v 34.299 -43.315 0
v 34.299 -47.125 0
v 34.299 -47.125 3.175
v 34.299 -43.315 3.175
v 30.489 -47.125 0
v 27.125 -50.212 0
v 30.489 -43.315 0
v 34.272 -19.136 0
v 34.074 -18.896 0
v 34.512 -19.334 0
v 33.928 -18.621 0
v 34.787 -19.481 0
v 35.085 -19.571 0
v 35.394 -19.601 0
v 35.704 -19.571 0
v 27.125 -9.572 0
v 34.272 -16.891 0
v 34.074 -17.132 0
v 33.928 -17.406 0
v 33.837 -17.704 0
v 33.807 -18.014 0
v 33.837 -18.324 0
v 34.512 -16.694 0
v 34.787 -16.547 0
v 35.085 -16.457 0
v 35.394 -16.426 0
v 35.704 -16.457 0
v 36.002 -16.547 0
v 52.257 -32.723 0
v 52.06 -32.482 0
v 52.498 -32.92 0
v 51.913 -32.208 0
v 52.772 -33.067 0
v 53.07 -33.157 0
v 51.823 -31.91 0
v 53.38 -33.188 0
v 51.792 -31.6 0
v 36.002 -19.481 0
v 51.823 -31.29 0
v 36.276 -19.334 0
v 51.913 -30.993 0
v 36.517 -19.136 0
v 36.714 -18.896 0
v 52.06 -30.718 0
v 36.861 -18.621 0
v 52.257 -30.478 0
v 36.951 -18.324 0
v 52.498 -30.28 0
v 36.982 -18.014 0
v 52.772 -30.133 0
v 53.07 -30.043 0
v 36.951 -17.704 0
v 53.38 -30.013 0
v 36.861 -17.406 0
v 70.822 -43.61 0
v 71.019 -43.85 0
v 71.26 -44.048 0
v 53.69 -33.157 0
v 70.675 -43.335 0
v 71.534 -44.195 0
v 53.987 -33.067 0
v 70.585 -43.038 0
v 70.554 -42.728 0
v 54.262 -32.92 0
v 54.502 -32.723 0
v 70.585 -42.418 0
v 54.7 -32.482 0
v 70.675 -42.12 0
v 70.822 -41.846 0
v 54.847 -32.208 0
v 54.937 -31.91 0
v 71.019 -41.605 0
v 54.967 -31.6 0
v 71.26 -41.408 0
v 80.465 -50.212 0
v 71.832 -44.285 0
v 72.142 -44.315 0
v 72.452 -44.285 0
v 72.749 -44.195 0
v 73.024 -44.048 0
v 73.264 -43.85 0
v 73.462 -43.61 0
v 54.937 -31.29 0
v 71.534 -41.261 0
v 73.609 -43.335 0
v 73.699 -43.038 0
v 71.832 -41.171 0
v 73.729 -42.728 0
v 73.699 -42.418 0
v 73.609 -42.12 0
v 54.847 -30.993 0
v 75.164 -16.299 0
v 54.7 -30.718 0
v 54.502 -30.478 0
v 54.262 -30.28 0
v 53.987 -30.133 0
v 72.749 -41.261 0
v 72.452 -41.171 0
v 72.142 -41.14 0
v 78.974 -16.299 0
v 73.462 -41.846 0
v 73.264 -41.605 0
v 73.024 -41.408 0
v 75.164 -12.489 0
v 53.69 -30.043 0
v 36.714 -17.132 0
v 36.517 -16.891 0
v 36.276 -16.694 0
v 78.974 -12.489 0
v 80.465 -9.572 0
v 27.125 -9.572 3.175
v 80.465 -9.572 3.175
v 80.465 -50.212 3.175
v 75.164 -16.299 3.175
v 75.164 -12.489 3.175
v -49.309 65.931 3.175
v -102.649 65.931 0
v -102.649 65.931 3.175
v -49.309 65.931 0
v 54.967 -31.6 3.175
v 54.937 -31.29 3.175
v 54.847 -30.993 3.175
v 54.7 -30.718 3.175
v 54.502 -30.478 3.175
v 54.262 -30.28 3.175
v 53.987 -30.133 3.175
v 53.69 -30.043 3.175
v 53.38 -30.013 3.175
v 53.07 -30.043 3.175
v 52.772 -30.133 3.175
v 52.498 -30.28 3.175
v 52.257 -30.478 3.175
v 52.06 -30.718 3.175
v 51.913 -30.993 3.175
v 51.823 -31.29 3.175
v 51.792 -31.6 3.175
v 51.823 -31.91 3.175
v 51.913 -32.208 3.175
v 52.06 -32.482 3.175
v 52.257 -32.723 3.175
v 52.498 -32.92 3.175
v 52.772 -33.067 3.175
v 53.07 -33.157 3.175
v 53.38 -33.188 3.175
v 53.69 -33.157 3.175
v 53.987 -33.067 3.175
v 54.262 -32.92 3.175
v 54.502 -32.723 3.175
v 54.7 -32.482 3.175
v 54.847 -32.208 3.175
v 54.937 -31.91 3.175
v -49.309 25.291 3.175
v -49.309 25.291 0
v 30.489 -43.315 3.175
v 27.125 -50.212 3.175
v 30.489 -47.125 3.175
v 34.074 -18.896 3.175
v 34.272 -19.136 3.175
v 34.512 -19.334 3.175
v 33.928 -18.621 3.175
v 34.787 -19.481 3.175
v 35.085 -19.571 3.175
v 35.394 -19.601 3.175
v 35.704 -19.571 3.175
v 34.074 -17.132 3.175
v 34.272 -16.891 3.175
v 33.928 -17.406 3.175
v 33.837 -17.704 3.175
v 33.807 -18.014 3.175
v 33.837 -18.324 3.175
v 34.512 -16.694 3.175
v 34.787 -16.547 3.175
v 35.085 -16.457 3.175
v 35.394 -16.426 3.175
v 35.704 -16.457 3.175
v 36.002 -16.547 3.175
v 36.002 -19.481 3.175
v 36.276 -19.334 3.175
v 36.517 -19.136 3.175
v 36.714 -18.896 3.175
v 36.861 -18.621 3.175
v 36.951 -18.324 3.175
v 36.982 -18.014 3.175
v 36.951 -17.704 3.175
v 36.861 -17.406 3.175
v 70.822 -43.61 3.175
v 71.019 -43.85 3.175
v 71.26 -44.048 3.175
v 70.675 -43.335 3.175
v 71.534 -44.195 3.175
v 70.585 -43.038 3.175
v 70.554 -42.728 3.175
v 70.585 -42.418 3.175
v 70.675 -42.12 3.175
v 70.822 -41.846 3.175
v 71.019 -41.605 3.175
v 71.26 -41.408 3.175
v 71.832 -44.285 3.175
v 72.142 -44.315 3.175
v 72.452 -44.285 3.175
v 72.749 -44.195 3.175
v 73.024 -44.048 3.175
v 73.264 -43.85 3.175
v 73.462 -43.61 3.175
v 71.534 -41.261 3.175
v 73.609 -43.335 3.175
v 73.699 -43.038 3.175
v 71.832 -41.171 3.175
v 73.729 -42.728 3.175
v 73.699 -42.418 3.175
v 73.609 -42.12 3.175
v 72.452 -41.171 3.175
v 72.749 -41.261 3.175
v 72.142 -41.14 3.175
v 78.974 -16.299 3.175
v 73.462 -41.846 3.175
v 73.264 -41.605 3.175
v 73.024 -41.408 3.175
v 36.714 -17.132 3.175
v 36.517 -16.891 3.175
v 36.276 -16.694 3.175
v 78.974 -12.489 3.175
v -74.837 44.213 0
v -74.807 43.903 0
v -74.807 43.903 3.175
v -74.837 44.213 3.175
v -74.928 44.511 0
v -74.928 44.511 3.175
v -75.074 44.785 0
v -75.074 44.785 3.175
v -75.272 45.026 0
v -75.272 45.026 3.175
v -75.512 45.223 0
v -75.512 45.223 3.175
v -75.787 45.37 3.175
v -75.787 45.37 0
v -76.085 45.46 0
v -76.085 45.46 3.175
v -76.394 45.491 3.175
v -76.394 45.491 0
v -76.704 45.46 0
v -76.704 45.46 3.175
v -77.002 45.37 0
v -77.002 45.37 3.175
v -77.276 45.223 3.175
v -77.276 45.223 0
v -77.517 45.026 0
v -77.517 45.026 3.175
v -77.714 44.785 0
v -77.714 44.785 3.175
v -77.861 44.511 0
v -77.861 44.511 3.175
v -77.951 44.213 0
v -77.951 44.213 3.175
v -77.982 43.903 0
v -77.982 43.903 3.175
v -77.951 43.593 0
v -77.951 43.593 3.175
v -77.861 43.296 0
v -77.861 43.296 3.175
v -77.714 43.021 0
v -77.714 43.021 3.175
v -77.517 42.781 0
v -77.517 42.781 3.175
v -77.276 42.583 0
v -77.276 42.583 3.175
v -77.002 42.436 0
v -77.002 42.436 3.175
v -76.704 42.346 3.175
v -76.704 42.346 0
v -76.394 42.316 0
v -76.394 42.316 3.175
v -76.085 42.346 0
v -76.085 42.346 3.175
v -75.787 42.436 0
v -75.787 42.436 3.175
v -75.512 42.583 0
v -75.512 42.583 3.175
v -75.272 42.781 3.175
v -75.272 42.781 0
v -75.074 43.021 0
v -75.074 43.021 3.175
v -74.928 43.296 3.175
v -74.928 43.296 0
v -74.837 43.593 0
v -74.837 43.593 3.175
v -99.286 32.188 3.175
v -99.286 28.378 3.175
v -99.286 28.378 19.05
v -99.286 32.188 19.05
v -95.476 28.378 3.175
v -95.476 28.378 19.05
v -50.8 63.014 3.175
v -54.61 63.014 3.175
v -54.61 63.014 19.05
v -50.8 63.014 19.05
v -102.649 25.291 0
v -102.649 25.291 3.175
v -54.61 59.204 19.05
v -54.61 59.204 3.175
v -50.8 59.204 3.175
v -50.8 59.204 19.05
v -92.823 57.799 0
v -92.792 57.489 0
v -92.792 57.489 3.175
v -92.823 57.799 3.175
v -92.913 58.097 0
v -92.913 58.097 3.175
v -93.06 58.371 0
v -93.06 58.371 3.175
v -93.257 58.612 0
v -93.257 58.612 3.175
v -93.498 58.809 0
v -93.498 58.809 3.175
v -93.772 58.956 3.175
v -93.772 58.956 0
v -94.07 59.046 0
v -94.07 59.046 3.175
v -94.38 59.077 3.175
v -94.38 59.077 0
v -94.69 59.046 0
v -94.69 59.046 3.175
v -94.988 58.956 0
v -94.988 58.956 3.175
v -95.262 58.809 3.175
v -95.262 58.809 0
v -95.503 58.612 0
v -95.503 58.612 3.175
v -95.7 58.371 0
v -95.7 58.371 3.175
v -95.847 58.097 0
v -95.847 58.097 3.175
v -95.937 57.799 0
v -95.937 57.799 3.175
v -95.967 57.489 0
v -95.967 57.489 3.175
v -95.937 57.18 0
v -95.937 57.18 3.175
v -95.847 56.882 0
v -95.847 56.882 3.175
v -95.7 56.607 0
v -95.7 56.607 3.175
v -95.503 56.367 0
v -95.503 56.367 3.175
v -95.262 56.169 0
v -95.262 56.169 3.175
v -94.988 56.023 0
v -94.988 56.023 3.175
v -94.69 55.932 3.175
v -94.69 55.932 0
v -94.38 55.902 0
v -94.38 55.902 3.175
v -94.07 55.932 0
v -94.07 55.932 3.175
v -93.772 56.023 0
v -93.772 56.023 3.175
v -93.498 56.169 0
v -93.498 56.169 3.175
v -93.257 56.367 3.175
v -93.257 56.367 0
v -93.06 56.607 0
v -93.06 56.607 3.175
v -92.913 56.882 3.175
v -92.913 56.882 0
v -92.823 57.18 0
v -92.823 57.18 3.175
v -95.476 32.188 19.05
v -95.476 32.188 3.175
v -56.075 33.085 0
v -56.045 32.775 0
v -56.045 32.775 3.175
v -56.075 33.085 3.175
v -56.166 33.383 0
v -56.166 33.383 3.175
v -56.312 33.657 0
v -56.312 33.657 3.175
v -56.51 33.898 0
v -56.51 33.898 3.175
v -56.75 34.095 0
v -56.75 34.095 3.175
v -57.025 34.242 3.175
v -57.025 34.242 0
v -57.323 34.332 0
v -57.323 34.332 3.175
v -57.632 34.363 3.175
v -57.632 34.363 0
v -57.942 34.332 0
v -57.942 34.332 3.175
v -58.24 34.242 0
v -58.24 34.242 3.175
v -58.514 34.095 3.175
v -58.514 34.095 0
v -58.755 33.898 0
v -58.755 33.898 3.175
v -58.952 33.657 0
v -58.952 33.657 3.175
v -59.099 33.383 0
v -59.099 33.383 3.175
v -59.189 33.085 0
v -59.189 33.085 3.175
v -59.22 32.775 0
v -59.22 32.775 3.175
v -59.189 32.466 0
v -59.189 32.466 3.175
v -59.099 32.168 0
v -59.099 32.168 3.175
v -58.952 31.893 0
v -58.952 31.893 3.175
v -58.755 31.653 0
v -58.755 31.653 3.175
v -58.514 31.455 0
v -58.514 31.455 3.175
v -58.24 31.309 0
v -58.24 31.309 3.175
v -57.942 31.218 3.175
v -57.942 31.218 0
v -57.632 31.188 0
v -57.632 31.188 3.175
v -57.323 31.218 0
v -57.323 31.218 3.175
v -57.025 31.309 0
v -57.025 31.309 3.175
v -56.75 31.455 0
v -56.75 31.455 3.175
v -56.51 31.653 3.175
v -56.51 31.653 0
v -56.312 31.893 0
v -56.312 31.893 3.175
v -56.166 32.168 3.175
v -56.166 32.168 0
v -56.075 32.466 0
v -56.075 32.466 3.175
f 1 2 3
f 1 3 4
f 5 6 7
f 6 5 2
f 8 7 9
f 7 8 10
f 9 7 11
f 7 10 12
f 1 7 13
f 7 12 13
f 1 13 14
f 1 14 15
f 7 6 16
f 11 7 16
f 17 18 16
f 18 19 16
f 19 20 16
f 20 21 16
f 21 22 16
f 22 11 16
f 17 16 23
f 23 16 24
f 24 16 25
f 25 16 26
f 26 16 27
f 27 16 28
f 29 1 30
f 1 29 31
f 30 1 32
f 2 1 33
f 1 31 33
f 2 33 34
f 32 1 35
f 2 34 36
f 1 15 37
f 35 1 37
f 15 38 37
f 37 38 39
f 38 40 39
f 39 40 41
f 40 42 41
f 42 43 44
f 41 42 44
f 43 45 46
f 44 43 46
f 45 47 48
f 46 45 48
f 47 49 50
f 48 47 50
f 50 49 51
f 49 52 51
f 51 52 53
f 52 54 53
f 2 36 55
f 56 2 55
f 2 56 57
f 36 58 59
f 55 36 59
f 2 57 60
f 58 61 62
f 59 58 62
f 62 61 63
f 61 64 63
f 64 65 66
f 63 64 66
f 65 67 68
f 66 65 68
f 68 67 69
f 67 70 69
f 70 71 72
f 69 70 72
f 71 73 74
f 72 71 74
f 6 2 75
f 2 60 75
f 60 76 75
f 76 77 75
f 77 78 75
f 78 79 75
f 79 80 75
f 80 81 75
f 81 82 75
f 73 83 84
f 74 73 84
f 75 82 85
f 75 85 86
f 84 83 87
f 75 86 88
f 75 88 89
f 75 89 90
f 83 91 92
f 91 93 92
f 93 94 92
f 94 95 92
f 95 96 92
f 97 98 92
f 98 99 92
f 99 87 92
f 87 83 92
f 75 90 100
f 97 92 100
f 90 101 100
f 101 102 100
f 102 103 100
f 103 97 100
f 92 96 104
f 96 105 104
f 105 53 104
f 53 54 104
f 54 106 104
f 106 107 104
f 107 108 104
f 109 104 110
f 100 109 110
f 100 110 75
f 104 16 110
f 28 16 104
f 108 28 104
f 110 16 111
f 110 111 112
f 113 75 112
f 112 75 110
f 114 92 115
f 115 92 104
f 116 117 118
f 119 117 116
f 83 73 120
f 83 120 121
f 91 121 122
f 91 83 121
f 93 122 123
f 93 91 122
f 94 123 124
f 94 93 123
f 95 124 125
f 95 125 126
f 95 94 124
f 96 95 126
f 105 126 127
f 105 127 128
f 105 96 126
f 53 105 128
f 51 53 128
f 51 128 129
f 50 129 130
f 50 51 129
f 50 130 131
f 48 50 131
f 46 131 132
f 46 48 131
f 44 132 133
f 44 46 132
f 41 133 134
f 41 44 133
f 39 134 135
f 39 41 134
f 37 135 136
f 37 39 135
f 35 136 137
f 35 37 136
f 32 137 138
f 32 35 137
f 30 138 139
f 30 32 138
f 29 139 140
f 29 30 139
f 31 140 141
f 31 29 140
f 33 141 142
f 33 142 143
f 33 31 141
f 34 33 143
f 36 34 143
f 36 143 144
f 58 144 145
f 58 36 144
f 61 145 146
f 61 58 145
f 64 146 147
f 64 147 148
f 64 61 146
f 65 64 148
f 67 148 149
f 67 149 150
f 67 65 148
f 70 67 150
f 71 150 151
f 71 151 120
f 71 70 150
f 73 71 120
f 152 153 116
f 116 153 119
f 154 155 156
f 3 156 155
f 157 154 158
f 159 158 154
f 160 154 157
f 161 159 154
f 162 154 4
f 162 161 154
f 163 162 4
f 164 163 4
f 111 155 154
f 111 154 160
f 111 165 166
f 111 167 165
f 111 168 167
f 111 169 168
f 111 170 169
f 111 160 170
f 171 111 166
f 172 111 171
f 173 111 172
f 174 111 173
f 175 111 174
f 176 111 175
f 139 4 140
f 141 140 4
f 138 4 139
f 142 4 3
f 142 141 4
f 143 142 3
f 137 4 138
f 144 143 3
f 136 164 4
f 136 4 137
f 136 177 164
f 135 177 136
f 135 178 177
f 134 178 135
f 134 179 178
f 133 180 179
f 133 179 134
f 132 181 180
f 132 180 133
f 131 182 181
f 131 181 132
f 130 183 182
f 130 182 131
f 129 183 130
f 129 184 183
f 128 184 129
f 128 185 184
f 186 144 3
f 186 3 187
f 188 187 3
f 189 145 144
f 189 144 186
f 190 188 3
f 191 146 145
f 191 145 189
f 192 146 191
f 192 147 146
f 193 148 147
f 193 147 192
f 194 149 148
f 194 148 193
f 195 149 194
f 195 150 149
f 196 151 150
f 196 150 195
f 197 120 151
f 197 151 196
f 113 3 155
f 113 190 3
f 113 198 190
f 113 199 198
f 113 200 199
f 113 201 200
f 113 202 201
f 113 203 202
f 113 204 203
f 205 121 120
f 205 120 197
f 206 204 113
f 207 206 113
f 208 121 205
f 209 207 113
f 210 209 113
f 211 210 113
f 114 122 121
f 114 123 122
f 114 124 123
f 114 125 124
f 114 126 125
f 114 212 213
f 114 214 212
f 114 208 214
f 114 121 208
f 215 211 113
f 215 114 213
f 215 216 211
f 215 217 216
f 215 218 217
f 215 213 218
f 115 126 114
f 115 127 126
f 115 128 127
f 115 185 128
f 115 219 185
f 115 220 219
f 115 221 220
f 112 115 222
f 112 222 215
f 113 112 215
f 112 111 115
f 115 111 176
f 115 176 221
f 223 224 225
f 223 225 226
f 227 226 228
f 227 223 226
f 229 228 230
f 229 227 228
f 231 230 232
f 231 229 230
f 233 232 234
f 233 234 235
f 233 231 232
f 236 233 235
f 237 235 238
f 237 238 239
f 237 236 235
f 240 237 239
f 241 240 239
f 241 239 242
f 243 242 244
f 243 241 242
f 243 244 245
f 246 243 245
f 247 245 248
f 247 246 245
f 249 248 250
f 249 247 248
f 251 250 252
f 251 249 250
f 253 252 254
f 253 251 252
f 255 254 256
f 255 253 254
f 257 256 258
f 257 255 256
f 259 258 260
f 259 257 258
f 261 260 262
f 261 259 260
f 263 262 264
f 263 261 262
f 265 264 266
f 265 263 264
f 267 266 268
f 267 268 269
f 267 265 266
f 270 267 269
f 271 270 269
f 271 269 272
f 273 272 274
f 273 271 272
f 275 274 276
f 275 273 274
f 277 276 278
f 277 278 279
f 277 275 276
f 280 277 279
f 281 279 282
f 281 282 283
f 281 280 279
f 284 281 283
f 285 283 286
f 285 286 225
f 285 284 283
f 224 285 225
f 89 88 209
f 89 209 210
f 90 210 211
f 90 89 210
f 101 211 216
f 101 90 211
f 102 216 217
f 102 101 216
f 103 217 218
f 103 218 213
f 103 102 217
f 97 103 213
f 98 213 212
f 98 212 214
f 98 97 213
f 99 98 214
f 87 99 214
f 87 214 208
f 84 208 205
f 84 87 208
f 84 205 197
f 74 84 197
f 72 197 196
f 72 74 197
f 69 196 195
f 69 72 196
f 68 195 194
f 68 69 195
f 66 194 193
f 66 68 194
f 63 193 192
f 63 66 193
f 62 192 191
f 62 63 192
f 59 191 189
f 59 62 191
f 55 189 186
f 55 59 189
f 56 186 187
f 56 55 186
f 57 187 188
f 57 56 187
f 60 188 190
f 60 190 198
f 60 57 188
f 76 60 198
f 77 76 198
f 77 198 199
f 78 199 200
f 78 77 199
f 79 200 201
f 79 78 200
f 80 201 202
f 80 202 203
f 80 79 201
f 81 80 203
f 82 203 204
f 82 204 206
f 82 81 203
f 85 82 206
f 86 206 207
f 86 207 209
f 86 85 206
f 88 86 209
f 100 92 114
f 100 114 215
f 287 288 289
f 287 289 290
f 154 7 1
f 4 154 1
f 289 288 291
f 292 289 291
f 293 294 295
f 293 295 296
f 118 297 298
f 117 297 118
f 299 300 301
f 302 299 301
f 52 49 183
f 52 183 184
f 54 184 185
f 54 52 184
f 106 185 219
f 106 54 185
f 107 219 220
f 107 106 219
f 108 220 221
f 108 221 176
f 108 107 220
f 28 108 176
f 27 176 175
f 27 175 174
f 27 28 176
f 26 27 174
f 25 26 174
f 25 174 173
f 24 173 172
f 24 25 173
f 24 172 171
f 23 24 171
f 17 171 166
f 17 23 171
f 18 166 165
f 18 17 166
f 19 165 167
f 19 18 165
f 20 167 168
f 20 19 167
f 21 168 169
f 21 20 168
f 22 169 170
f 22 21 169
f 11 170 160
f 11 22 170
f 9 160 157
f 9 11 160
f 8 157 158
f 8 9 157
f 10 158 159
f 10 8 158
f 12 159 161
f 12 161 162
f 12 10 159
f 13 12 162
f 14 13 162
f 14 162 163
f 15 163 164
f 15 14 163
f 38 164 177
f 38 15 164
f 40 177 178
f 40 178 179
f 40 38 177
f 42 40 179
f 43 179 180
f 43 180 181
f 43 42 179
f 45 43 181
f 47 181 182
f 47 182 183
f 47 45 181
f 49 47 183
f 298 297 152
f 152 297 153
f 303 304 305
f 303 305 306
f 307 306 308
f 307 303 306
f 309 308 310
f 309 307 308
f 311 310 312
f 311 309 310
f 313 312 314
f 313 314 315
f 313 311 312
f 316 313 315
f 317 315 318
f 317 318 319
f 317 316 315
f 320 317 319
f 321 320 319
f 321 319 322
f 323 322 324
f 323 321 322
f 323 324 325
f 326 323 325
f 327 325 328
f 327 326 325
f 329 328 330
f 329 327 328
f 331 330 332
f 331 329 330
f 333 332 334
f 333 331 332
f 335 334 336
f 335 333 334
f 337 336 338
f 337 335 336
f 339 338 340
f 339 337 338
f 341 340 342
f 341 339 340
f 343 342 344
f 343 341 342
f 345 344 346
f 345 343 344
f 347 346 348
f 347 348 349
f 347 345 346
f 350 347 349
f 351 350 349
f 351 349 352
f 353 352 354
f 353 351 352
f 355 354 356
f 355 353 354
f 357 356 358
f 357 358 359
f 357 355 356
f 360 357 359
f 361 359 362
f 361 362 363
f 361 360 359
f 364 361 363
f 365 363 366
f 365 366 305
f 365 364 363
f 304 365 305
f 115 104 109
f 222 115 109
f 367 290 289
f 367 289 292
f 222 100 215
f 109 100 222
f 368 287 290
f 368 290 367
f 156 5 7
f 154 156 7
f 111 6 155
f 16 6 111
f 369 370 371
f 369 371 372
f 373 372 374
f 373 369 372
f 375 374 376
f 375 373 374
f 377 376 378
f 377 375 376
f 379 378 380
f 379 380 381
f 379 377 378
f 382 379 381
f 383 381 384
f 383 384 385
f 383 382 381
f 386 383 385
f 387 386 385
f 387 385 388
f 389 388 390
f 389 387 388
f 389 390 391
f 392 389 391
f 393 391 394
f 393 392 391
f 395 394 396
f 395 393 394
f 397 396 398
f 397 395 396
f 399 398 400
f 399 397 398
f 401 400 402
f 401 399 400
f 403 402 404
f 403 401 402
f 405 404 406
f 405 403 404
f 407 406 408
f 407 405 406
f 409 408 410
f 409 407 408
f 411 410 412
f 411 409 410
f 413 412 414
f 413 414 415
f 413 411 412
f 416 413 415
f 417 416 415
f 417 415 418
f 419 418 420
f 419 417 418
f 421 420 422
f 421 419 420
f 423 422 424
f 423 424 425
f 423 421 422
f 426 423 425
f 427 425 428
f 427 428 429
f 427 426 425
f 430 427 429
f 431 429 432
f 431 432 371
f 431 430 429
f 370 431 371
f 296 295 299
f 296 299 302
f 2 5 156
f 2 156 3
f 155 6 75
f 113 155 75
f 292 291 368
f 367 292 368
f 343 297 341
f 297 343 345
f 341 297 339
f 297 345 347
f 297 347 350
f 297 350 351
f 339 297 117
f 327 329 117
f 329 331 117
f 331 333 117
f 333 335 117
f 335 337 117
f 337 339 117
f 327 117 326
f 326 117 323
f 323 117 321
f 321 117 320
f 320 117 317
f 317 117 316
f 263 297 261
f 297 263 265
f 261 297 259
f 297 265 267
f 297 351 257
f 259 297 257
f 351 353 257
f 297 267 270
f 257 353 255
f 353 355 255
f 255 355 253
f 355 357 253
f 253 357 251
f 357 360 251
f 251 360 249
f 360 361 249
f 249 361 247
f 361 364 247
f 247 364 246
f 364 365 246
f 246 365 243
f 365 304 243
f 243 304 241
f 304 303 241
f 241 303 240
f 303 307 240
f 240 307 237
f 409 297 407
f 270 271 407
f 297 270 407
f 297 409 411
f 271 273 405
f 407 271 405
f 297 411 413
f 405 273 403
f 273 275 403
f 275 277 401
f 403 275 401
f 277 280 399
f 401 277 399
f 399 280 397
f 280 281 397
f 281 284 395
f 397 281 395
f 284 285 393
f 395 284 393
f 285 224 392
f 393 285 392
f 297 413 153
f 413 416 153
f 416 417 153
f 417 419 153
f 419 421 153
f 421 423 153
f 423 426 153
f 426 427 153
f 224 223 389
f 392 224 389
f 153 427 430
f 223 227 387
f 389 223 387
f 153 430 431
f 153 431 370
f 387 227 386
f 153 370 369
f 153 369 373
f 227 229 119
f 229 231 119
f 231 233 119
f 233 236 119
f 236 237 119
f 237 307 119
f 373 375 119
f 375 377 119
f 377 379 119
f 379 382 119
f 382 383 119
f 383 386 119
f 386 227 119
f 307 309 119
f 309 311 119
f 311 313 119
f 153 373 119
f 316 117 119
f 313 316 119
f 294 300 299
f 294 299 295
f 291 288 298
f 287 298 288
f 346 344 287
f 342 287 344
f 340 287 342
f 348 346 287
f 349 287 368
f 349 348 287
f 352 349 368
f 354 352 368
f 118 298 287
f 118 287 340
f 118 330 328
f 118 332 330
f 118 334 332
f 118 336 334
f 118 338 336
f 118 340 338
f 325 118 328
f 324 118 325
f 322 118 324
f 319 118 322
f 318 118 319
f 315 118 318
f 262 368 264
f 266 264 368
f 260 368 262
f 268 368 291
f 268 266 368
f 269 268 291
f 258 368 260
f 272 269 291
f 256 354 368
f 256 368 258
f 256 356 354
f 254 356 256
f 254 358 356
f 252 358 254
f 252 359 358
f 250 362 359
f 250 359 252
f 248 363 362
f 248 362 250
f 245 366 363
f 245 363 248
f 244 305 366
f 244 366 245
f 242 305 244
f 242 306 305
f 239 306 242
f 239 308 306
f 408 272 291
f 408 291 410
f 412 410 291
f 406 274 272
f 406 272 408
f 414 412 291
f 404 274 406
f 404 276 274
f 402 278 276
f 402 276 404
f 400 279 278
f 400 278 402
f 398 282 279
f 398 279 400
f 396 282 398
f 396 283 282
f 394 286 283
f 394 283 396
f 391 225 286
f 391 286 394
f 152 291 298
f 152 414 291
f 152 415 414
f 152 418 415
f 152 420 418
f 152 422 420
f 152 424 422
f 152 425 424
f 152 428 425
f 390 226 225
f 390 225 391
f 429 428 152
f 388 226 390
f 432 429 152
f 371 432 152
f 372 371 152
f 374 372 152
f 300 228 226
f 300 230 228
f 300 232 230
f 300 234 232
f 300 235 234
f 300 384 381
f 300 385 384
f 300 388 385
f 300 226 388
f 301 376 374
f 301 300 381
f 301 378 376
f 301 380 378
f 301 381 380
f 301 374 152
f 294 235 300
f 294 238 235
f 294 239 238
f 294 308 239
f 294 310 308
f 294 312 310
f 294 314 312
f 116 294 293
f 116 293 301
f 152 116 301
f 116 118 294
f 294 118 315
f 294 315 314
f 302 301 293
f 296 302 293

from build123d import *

# Parameters (mm, degrees)
F0_W     = 53.34
F0_H     = 40.64
F0_W_2   = 3.81
F0_H_2   = 3.81
F0_R     = 5.715
F0_R_2   = 15.877972
F0_R_3   = 6.35
F0_R_4   = 1.5875
F1_DEPTH = 3.175
F2_DEPTH = 3.175
F3_DEPTH = 19.05


with BuildPart() as f1:
    # F0 (on Top) → F1 (new body)
    with BuildSketch(Plane.XY):
        with Locations((53.795356, -29.89229)):
            Rectangle(F0_W, F0_H)
        with Locations((32.393763, -45.220239)):
            Rectangle(F0_W_2, F0_H_2, mode=Mode.SUBTRACT)
        with Locations((72.14196, -42.727947)):
            Circle(F0_R, mode=Mode.SUBTRACT)
        with Locations((53.379953, -31.600136)):
            Circle(F0_R_2, mode=Mode.SUBTRACT)
        with Locations((35.3943, -18.013854)):
            Circle(F0_R_3, mode=Mode.SUBTRACT)
        with Locations((77.069087, -14.394265)):
            Rectangle(F0_W_2, F0_H_2, mode=Mode.SUBTRACT)
        with Locations((53.379953, -31.600136)):
            Circle(F0_R_2)
        with Locations((53.379953, -31.600136)):
            Circle(F0_R_4, mode=Mode.SUBTRACT)
        with Locations((72.14196, -42.727947)):
            Circle(F0_R)
        with Locations((72.14196, -42.727947)):
            Circle(F0_R_4, mode=Mode.SUBTRACT)
        with Locations((35.3943, -18.013854)):
            Circle(F0_R_3)
        with Locations((35.3943, -18.013854)):
            Circle(F0_R_4, mode=Mode.SUBTRACT)
    extrude(amount=F1_DEPTH)


with BuildPart() as f2:
    # F0 (on Top) → F2 (new body)
    with BuildSketch(Plane.XY):
        with Locations((-75.97894, 45.610995)):
            Rectangle(F0_W, F0_H)
        with Locations((-97.380533, 30.283046)):
            Rectangle(F0_W_2, F0_H_2, mode=Mode.SUBTRACT)
        with Locations((-57.632336, 32.775338)):
            Circle(F0_R, mode=Mode.SUBTRACT)
        with Locations((-76.394343, 43.903149)):
            Circle(F0_R_2, mode=Mode.SUBTRACT)
        with Locations((-94.379996, 57.489432)):
            Circle(F0_R_3, mode=Mode.SUBTRACT)
        with Locations((-52.705209, 61.109021)):
            Rectangle(F0_W_2, F0_H_2, mode=Mode.SUBTRACT)
        with Locations((-57.632336, 32.775338)):
            Circle(F0_R)
        with Locations((-57.632336, 32.775338)):
            Circle(F0_R_4, mode=Mode.SUBTRACT)
        with Locations((-76.394343, 43.903149)):
            Circle(F0_R_2)
        with Locations((-76.394343, 43.903149)):
            Circle(F0_R_4, mode=Mode.SUBTRACT)
        with Locations((-94.379996, 57.489432)):
            Circle(F0_R_3)
        with Locations((-94.379996, 57.489432)):
            Circle(F0_R_4, mode=Mode.SUBTRACT)
    extrude(amount=F2_DEPTH)

    # F0 (on Top) → F3 (join)
    with BuildSketch(Plane.XY):
        with Locations((-97.380533, 30.283046)):
            Rectangle(F0_W_2, F0_H_2)
        with Locations((-52.705209, 61.109021)):
            Rectangle(F0_W_2, F0_H_2)
    extrude(amount=F3_DEPTH)


solid = Compound([f1.part, f2.part])
